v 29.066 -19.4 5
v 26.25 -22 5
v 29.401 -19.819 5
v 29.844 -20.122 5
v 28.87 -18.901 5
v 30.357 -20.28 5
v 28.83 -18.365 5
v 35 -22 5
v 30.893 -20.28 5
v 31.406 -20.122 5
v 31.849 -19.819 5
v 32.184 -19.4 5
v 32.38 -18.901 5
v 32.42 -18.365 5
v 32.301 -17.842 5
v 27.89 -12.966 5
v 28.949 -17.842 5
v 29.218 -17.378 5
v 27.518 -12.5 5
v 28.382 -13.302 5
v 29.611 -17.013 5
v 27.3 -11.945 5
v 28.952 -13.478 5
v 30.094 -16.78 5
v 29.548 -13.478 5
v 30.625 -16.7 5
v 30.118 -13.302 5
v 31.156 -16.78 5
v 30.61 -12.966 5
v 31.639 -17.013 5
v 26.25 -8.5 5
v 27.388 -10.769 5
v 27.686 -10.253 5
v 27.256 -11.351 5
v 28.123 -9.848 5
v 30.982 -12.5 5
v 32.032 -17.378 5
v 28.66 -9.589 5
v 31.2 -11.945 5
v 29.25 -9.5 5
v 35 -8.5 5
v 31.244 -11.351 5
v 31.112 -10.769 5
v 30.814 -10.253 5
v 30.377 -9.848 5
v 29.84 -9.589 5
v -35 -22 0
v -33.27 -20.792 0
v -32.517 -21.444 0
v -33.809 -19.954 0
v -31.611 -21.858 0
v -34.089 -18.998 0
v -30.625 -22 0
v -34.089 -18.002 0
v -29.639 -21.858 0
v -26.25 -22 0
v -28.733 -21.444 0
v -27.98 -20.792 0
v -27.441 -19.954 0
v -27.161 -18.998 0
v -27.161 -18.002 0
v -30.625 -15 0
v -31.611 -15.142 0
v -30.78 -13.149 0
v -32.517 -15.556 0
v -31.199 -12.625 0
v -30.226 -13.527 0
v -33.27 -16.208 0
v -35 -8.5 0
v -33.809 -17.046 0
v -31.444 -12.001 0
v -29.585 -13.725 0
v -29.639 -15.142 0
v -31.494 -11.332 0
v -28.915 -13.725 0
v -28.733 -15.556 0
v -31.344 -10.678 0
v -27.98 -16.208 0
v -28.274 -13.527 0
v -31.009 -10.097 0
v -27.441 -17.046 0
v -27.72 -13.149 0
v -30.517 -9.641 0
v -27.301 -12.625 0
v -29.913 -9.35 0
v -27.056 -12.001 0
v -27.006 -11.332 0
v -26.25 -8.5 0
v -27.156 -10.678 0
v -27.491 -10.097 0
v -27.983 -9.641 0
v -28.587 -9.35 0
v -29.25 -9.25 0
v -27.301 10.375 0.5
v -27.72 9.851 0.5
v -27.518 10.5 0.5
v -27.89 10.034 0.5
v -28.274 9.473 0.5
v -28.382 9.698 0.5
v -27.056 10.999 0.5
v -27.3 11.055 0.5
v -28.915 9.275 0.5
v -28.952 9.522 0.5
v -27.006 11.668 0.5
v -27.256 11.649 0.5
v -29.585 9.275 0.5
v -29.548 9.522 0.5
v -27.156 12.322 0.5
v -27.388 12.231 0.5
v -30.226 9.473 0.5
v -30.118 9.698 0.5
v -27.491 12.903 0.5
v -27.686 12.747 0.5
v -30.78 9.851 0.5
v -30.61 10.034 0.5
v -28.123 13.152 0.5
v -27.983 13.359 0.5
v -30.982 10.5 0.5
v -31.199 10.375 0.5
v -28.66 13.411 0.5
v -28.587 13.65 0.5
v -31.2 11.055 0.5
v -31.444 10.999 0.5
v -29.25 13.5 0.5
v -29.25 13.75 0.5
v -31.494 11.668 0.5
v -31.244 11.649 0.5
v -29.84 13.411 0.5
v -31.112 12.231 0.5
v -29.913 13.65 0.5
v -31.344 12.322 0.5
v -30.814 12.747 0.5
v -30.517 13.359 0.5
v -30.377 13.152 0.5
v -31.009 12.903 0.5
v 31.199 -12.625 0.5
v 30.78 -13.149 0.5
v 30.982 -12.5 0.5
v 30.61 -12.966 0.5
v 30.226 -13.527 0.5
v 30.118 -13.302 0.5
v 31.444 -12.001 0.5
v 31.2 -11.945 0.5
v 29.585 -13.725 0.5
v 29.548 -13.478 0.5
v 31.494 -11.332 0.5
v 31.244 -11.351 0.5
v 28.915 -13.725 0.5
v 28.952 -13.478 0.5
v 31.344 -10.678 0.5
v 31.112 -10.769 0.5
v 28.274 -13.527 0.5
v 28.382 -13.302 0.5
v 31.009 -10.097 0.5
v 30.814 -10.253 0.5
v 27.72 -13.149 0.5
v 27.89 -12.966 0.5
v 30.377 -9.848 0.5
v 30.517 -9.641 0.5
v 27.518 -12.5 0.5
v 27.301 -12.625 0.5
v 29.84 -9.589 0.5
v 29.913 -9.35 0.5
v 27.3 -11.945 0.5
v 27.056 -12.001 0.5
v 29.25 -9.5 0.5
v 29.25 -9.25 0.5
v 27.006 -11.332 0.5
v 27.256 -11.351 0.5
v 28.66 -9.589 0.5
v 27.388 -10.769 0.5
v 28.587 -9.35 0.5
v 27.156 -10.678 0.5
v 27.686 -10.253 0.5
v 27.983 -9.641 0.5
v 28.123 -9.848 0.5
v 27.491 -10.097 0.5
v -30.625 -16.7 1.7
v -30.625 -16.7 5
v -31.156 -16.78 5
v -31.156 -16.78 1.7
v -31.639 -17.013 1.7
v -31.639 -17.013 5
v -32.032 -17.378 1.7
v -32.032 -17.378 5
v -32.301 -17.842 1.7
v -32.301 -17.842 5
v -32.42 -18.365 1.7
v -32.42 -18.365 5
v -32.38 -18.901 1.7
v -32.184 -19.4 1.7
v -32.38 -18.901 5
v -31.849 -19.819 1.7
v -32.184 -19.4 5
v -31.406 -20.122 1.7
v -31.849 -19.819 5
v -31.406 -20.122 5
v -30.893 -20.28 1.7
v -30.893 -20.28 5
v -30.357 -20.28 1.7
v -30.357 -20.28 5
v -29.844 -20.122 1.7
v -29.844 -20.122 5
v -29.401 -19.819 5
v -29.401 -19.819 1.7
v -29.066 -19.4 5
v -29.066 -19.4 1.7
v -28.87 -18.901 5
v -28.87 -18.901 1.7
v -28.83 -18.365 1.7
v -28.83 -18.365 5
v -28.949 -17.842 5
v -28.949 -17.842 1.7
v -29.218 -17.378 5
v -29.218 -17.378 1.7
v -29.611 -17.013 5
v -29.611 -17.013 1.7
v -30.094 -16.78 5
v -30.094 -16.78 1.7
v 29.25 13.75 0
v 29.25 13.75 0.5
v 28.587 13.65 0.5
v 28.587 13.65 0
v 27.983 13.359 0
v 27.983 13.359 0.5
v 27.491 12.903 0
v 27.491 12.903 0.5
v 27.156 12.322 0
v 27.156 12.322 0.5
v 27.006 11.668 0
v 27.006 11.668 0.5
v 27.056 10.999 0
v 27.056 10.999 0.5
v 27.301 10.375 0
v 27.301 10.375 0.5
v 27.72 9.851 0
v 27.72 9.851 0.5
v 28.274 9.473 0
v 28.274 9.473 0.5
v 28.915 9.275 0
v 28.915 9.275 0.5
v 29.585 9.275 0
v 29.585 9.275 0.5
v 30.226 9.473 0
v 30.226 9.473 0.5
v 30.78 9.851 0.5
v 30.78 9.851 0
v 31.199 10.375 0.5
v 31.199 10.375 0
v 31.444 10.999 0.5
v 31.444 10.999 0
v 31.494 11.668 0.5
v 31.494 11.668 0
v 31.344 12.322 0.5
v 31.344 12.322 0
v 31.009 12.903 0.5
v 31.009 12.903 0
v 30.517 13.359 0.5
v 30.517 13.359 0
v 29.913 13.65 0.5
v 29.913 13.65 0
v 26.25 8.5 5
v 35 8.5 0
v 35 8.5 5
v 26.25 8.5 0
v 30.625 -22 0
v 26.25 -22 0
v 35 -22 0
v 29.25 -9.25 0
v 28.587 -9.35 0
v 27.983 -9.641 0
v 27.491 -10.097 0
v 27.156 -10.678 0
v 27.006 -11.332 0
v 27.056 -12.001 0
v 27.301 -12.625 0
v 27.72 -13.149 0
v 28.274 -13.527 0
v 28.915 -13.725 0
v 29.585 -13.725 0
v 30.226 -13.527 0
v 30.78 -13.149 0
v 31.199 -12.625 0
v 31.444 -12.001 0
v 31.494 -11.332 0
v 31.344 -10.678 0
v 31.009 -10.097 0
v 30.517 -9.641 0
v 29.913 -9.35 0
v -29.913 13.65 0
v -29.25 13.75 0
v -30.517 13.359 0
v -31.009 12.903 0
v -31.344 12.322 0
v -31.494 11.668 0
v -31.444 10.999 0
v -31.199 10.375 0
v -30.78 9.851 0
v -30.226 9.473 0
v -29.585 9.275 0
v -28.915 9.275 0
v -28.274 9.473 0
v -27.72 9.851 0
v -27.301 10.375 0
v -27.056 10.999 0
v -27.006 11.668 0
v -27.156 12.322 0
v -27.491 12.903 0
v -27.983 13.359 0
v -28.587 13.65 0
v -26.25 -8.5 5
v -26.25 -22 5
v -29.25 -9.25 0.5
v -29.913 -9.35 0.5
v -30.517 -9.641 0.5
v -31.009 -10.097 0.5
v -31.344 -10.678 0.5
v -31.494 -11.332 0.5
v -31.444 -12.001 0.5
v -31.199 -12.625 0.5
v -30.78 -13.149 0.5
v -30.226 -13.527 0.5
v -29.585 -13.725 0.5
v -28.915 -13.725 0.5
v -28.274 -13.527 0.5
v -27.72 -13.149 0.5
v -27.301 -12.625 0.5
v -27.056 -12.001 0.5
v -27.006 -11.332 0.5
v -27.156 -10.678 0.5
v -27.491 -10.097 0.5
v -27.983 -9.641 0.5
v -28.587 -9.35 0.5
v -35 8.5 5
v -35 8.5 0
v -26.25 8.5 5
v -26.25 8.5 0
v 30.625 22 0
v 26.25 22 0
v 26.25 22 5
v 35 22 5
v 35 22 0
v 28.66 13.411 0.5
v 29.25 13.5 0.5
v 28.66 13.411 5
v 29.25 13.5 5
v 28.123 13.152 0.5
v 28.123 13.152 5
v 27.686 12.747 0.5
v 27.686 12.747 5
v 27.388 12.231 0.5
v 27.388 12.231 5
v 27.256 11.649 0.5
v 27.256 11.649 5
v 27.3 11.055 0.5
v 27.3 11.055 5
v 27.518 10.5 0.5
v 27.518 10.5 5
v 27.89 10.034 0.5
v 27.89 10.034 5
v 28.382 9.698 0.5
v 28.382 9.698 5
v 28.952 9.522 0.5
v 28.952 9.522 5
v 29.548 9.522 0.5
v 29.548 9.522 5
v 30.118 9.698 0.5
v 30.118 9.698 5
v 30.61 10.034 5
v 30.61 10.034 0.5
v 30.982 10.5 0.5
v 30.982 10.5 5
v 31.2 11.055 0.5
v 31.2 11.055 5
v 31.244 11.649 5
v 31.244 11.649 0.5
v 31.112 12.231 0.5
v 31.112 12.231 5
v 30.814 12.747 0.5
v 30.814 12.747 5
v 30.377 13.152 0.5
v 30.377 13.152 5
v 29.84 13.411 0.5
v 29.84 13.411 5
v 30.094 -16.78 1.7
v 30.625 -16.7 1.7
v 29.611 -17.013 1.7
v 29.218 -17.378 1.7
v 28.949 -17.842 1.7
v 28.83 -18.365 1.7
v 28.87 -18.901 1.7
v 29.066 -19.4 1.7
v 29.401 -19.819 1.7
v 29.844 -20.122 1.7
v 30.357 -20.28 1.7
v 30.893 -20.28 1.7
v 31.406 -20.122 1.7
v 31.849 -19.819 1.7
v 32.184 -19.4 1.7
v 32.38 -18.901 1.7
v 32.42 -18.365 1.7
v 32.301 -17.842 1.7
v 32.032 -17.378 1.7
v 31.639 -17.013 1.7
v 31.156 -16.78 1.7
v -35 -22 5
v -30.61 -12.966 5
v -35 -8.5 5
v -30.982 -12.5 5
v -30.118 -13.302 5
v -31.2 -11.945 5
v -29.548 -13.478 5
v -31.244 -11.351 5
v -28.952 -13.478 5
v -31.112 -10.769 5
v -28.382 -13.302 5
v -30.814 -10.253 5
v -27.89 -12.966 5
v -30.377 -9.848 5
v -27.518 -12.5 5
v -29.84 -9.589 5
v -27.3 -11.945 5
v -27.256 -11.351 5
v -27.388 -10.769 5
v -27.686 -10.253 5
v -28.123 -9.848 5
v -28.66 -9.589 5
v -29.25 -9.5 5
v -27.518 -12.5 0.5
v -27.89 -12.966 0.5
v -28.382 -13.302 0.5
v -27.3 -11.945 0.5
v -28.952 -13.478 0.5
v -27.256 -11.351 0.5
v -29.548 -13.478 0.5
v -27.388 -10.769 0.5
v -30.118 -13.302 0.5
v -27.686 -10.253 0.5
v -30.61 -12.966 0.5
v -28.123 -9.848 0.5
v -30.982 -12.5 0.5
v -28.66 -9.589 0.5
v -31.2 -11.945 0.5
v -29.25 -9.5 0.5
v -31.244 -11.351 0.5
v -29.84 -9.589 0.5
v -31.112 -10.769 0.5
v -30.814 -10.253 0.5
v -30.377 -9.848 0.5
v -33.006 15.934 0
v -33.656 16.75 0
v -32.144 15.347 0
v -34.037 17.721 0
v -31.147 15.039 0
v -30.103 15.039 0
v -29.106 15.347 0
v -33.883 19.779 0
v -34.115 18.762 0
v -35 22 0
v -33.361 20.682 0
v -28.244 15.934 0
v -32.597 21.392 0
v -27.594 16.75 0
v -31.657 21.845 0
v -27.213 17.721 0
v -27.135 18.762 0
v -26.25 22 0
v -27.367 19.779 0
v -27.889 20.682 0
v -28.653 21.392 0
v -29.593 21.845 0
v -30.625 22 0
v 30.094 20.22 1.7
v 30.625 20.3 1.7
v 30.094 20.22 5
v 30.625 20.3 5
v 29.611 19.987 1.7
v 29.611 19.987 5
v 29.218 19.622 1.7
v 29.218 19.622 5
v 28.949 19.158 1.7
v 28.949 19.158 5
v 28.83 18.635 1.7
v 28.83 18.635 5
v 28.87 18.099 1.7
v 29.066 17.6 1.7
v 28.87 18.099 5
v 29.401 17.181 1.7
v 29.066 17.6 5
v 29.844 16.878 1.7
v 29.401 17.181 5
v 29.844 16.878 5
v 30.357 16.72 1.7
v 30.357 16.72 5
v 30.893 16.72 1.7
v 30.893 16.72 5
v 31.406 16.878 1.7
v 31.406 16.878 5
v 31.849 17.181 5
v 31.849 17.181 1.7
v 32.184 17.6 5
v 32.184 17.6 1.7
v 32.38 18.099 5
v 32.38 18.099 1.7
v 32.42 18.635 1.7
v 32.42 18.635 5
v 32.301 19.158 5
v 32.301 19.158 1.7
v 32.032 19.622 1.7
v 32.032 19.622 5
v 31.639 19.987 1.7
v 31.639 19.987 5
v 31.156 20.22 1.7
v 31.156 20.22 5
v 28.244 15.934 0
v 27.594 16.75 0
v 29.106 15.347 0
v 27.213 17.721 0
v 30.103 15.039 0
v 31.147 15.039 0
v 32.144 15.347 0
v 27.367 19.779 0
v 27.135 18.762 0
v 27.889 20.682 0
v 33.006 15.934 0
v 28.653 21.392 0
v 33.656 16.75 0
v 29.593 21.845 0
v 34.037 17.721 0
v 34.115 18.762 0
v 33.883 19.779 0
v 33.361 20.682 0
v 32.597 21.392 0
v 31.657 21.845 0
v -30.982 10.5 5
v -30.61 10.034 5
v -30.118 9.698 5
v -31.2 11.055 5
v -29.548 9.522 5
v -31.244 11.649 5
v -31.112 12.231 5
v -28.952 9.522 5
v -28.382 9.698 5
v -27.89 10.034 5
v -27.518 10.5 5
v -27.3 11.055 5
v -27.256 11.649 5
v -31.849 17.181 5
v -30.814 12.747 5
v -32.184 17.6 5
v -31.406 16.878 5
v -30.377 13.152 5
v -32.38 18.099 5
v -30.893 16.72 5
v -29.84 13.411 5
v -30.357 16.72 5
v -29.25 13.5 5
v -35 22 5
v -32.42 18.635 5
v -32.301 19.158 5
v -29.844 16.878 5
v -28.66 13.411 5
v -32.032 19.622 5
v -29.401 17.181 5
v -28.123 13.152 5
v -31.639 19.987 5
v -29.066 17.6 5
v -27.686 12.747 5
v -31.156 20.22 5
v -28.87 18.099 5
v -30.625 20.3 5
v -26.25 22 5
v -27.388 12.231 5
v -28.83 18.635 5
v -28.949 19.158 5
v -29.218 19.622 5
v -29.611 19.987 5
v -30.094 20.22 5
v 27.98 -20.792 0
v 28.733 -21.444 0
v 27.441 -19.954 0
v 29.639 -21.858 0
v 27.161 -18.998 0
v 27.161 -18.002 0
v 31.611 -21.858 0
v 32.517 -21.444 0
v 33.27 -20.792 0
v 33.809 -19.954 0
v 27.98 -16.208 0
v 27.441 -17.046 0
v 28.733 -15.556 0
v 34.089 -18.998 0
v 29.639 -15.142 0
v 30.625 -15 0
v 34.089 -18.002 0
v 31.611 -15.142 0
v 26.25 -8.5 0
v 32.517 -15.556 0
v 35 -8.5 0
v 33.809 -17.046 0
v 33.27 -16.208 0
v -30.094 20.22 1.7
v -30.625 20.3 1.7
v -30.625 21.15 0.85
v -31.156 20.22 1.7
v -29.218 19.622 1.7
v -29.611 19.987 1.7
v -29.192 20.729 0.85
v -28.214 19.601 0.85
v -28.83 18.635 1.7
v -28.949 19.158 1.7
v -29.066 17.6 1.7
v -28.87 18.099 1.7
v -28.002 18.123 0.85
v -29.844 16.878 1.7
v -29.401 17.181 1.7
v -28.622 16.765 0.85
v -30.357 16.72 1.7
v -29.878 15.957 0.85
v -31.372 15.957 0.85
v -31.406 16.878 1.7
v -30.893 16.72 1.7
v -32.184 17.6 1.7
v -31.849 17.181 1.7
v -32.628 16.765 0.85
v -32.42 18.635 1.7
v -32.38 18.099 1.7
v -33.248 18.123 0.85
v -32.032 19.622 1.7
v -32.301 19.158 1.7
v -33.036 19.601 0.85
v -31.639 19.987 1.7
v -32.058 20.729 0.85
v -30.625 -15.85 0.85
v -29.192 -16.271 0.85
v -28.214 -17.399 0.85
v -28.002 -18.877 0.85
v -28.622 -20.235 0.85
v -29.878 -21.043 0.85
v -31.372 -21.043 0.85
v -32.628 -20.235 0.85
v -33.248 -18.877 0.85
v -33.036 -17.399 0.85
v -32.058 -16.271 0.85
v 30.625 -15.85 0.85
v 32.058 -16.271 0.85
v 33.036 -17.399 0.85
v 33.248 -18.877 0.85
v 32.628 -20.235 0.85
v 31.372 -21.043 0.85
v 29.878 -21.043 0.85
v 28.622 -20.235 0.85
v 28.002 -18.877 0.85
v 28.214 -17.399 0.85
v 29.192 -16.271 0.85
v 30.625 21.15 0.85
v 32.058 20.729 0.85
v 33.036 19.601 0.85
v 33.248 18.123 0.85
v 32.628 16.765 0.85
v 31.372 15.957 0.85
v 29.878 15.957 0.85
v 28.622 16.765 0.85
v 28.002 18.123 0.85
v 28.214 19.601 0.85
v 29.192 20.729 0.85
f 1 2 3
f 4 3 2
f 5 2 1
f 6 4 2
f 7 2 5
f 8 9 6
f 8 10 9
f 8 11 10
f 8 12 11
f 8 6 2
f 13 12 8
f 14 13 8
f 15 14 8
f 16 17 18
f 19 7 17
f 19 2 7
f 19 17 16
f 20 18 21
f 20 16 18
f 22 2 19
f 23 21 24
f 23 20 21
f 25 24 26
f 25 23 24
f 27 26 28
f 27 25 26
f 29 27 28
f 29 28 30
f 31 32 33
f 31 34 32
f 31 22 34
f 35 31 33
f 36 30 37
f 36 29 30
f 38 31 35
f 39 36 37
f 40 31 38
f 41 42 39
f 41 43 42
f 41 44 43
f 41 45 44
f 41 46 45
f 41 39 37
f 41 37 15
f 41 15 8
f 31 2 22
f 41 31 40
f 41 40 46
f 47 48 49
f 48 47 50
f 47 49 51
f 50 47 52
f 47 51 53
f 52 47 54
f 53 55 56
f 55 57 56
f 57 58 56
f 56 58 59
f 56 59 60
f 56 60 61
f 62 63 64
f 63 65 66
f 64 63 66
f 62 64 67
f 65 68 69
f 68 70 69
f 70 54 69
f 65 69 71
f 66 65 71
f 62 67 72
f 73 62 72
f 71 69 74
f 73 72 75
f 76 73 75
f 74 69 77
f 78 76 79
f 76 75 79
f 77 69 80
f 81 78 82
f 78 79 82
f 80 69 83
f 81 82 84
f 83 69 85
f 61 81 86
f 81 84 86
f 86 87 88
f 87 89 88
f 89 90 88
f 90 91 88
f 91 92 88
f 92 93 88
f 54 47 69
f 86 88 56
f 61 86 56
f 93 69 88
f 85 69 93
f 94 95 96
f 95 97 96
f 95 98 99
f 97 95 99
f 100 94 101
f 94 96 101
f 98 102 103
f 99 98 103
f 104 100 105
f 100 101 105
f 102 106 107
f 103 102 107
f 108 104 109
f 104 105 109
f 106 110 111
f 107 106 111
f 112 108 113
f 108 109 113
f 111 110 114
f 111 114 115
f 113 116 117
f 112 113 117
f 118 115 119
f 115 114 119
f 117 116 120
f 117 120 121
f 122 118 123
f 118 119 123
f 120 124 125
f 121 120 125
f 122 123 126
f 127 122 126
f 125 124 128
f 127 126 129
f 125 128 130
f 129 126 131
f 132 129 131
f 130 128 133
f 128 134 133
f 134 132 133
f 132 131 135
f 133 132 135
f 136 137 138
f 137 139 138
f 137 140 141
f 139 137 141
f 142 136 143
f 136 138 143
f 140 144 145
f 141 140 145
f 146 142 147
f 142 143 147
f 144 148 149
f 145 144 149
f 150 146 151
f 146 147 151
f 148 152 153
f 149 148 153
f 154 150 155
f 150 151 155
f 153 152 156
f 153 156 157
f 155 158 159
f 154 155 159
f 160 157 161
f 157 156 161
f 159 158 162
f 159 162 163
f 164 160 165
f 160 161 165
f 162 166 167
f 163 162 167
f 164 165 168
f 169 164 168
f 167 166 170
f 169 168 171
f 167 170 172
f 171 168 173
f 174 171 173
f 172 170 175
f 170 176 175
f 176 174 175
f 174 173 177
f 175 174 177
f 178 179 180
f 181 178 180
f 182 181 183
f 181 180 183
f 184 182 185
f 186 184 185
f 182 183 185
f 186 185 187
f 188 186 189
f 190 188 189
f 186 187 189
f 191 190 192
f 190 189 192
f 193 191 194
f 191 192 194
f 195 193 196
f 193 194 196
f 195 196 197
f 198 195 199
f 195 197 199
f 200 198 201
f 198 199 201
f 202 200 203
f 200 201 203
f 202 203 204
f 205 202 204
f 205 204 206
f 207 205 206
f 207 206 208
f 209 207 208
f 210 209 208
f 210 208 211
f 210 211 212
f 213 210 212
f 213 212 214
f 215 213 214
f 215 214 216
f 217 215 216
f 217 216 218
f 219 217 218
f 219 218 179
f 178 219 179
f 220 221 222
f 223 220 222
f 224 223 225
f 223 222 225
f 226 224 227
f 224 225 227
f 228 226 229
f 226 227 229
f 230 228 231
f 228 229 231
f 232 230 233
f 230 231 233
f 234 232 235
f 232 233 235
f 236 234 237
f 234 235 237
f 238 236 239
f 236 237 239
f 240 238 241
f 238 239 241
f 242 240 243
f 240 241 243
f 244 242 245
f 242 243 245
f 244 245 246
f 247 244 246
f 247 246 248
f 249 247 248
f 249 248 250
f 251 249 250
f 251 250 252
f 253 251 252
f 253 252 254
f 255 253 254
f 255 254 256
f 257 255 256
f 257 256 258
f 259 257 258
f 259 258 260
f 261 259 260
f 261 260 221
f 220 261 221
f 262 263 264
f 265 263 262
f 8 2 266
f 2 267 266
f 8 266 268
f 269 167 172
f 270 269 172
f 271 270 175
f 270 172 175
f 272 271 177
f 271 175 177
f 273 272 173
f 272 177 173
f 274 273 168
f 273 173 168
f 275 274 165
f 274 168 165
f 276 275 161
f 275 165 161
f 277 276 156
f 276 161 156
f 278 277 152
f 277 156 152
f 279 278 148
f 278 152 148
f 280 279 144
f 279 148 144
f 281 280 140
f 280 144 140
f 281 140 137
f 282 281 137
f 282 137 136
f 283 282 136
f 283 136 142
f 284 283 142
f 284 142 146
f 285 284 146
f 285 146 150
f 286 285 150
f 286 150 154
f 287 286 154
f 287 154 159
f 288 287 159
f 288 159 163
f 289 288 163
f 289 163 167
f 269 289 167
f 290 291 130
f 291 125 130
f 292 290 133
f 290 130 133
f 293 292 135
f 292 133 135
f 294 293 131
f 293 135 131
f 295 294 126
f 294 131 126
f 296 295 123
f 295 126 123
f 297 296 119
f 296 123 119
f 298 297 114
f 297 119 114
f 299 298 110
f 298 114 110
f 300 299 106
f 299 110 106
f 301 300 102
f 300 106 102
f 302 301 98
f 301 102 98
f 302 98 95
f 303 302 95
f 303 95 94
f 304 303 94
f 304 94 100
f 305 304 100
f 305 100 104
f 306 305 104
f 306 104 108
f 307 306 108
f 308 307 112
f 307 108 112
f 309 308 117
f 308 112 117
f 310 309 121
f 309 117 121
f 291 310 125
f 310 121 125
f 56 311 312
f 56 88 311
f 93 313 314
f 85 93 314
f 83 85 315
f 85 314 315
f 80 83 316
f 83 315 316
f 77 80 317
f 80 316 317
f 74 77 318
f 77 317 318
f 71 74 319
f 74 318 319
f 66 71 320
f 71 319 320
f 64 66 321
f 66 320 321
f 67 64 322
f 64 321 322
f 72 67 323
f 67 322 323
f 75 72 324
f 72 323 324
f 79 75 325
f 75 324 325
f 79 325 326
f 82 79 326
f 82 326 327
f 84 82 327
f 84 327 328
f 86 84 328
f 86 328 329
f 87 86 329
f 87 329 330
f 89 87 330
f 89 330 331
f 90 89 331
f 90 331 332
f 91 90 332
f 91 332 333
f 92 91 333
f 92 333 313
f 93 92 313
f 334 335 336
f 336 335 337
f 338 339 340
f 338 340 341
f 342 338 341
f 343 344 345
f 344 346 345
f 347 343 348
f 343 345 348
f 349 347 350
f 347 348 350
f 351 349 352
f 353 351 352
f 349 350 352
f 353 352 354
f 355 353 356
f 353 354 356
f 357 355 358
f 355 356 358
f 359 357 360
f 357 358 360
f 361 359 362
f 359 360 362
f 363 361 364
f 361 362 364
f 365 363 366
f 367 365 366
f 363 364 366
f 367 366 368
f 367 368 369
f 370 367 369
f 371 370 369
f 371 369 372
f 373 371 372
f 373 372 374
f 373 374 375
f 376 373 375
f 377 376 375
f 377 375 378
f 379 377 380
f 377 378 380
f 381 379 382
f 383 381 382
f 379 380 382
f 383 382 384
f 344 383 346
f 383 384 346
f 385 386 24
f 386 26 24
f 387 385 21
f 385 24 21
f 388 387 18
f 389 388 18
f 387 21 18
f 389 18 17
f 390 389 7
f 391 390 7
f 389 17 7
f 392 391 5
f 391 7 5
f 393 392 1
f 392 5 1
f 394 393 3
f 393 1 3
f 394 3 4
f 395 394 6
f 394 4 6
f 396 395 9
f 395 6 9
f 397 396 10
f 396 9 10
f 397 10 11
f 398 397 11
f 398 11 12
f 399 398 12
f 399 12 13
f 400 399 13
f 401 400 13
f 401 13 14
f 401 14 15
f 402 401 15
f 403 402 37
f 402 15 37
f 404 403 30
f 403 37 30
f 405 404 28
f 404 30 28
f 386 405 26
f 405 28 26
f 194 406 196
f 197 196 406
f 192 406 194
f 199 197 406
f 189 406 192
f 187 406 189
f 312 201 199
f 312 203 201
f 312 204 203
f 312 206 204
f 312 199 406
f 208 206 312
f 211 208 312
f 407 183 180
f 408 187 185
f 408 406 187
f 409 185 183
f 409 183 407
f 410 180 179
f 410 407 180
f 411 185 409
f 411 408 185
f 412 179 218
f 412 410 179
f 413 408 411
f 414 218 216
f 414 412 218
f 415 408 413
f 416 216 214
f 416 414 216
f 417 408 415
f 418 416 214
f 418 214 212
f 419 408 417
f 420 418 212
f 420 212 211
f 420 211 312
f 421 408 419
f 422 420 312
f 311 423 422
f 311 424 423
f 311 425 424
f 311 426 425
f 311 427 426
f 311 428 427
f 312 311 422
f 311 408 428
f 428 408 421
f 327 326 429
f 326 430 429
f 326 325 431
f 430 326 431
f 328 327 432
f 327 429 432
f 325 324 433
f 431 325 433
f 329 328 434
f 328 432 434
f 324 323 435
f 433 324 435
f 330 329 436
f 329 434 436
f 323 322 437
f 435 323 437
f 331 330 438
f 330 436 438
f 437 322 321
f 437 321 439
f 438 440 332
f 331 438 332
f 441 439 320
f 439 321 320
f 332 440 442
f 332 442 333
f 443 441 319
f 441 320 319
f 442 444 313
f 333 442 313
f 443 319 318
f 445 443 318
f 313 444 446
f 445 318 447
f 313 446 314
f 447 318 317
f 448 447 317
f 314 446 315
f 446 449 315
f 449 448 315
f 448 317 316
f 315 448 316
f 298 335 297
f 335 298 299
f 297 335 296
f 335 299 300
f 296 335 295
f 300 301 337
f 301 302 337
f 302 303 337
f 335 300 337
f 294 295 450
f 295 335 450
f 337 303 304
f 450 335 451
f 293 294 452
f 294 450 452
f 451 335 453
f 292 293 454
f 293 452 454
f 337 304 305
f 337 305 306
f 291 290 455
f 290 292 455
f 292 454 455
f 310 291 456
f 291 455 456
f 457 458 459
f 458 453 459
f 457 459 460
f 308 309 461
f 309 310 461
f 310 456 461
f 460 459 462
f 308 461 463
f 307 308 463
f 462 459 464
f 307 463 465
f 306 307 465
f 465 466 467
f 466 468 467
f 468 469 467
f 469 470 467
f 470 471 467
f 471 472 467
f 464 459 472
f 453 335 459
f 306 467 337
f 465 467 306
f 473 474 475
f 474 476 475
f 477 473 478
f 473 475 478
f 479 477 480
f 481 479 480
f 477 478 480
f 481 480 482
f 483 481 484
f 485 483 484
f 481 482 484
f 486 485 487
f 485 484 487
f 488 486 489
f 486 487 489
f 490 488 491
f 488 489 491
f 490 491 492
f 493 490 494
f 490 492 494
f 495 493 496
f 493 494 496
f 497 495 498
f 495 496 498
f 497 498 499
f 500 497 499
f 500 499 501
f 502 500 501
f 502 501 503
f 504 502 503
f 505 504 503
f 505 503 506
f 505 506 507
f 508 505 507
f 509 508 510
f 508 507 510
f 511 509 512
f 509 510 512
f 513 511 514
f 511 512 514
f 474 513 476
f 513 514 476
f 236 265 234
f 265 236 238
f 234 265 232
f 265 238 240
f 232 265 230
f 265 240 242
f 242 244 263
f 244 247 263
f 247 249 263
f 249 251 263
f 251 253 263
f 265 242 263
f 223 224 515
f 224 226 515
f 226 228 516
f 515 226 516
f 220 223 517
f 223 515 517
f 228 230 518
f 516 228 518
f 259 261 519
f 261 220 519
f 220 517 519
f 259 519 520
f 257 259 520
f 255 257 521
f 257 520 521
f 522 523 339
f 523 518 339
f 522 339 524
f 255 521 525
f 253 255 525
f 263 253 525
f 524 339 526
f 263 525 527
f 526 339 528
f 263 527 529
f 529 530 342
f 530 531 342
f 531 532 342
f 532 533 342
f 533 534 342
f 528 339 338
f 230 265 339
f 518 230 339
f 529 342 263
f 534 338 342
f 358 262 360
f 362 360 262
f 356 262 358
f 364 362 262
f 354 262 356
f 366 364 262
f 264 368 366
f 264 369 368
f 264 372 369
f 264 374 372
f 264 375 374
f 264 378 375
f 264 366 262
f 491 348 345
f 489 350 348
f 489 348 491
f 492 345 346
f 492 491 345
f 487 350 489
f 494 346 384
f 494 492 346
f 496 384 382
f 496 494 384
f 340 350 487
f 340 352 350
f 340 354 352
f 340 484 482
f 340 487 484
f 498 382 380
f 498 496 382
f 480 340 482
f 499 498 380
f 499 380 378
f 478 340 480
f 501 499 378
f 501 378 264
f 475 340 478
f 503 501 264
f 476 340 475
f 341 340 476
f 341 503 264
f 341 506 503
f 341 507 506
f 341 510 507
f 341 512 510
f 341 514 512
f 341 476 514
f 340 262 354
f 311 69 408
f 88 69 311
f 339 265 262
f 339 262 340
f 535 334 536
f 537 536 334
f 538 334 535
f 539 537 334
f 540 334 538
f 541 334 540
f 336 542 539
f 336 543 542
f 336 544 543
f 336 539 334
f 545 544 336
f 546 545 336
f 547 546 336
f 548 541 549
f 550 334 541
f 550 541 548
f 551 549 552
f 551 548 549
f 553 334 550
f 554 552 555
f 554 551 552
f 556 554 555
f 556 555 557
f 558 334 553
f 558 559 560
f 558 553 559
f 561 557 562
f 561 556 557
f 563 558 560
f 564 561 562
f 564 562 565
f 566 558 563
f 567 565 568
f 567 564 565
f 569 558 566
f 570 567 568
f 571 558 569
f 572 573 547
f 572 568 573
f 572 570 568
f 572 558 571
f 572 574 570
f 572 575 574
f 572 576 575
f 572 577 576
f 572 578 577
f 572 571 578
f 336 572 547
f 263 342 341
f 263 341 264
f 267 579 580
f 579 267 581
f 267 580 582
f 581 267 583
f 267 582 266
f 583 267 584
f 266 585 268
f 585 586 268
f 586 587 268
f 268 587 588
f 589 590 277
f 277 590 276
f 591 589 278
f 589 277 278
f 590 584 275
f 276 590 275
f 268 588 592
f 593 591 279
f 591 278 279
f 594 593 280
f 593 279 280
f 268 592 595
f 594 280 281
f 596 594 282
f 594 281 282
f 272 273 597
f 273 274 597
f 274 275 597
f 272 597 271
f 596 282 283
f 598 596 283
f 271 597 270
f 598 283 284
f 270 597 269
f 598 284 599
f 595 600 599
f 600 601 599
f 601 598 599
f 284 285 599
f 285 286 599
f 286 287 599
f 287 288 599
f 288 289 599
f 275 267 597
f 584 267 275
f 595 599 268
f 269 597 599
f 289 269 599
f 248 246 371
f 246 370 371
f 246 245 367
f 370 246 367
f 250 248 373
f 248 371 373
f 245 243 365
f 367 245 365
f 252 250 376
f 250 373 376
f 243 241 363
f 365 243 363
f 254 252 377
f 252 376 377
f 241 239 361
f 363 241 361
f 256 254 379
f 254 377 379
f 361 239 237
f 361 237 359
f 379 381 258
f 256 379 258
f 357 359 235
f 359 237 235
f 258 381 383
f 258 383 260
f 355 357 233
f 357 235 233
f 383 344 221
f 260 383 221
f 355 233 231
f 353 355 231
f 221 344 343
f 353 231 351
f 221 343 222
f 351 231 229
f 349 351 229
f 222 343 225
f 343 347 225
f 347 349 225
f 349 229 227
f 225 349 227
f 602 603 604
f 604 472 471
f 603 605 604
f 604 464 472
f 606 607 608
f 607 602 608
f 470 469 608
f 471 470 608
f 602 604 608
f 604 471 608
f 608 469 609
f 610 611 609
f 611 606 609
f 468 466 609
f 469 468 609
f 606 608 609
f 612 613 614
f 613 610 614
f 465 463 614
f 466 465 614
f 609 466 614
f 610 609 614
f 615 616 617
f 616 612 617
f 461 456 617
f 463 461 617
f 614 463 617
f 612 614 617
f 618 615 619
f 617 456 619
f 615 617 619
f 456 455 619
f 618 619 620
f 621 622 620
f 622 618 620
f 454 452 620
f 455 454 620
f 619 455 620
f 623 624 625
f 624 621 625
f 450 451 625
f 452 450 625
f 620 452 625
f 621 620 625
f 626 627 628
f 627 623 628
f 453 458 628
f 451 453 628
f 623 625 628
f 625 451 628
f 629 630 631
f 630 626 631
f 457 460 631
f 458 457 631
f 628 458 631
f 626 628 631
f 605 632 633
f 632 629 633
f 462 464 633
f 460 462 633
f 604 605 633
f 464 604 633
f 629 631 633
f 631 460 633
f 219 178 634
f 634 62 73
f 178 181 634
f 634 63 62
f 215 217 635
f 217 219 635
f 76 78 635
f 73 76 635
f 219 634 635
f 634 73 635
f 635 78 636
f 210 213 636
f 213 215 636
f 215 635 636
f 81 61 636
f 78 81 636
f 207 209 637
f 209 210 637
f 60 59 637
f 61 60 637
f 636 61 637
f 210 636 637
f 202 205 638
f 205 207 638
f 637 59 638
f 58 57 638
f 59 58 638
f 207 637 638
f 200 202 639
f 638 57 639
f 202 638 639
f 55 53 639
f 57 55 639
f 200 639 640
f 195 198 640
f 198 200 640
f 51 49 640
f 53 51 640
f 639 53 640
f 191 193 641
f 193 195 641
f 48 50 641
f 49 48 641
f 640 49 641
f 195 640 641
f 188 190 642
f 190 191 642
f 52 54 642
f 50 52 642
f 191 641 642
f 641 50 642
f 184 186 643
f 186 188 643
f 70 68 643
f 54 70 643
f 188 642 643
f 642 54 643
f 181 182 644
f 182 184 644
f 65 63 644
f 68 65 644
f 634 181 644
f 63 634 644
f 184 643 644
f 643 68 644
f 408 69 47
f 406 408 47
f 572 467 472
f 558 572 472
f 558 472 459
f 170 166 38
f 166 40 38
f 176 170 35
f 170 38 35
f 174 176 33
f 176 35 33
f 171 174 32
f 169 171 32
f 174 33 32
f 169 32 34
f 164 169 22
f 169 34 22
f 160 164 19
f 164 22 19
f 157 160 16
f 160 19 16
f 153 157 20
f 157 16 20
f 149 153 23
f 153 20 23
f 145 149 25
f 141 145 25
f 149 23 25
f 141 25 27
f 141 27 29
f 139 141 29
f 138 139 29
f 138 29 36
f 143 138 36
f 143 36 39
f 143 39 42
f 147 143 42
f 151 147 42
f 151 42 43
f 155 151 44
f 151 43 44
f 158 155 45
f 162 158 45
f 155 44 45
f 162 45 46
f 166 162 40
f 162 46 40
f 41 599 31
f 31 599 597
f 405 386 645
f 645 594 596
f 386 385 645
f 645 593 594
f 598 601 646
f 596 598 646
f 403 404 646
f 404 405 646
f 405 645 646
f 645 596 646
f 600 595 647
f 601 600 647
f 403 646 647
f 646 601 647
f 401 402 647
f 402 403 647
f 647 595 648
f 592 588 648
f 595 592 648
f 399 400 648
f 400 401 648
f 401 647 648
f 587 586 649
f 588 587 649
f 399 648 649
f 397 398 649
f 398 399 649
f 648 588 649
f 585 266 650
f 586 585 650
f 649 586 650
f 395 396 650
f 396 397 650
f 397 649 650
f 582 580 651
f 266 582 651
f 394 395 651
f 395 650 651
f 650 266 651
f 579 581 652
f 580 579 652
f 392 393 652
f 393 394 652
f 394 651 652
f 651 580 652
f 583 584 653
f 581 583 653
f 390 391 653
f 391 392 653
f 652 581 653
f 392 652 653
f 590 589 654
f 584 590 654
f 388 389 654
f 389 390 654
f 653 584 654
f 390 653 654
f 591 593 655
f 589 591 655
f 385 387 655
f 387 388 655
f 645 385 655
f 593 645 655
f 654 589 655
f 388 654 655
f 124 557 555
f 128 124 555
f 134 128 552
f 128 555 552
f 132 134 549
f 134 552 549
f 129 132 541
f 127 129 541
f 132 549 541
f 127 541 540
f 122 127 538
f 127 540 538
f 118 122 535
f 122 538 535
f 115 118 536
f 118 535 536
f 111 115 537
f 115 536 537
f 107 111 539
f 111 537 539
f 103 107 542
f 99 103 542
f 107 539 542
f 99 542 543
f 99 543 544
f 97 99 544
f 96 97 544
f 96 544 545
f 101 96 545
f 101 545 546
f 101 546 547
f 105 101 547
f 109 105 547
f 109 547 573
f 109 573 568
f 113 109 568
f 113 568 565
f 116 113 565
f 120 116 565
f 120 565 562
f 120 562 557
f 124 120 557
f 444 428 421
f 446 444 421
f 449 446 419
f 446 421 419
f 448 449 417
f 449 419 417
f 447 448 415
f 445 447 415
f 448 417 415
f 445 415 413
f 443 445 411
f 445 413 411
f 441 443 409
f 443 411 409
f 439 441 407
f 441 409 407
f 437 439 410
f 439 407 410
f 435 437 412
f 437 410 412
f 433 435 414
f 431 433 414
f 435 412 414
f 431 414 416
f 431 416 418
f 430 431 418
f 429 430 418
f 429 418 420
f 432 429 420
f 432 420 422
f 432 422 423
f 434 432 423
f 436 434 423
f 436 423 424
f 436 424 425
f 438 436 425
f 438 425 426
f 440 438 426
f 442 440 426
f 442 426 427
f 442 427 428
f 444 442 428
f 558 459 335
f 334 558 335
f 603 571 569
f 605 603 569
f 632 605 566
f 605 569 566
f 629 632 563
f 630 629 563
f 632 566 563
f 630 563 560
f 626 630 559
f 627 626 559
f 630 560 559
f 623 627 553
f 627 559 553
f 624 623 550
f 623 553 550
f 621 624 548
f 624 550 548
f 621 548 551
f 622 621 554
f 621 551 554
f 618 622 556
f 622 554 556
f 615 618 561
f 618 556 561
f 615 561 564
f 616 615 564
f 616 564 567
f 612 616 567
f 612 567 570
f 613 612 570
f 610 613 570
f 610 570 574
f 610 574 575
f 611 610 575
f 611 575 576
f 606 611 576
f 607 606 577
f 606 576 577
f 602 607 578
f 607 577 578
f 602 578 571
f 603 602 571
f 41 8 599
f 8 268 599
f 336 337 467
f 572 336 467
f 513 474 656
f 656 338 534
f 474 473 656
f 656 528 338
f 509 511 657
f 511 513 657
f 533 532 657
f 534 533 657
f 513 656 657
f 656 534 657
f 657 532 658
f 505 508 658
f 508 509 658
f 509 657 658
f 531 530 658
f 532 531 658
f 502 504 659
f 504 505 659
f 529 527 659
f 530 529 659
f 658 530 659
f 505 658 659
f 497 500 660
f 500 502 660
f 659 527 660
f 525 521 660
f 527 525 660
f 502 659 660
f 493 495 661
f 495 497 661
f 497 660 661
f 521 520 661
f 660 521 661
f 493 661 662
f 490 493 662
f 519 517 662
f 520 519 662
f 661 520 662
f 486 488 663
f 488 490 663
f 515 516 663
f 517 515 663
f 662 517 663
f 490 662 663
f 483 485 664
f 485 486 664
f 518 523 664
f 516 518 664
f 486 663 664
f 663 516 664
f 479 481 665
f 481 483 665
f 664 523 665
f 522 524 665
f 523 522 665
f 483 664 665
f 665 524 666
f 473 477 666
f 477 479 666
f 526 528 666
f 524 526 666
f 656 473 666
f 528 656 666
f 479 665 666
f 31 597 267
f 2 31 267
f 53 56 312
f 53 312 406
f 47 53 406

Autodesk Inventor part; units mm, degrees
ref_plane "YZ Plane" through (0, 0, 0) normal (1, 0, 0) x (0, 1, 0)
ref_plane "XZ Plane" through (0, 0, 0) normal (0, 1, 0) x (-1, 0, 0)
ref_plane "XY Plane" through (0, 0, 0) normal (0, 0, 1) x (1, 0, 0)
ref_plane "Work Plane1" through (0, 0, 0) normal (0, 0, 1) x (1, 0, 0)
sketch "Sketch1" plane through (0, 0, 0) normal (0, 0, 1) x (1, 0, 0)
  line L0 (-35, 15) -> (-35, -15) projected
  line L1 (-35, -15) -> (35, -15) projected
  line L2 (35, -15) -> (35, 15) projected
  line L3 (35, 15) -> (-35, 15) projected
  circle A0 centre (29.25, 11.5) radius 1.5 projected
  circle A1 centre (29.25, -11.5) radius 1.5 projected
  circle A2 centre (-29.25, 11.5) radius 1.5 projected
  circle A3 centre (-29.25, -11.5) radius 1.5 projected
  line L4 (35, 8.5) -> (26.25, 8.5)
  line L5 (26.25, 8.5) -> (26.25, 22)
  line L6 (26.25, 22) -> (35, 22)
  line L7 (35, 22) -> (35, 8.5)
  line L8 (35, -8.5) -> (26.25, -8.5)
  line L9 (26.25, -8.5) -> (26.25, -22)
  line L10 (26.25, -22) -> (35, -22)
  line L11 (35, -22) -> (35, -8.5)
  line L12 (-35, 8.5) -> (-26.25, 8.5)
  line L13 (-26.25, 8.5) -> (-26.25, 22)
  line L14 (-26.25, 22) -> (-35, 22)
  line L15 (-35, 22) -> (-35, 8.5)
  line L16 (-35, -8.5) -> (-26.25, -8.5)
  line L17 (-26.25, -8.5) -> (-26.25, -22)
  line L18 (-26.25, -22) -> (-35, -22)
  line L19 (-35, -22) -> (-35, -8.5)
  point P0 (0, 0)
  dimension "d0" = 3
  dimension "d1" = 3
  dimension "d2" = 7
  dimension "d3" = 3
  dimension "d4" = 3
  dimension "d5" = 7
  dimension "d6" = 7
  dimension "d7" = 3
  dimension "d8" = 3
  dimension "d9" = 3
  dimension "d10" = 3
  dimension "d11" = 7
extrude "Extrusion1" add sketch "Sketch1" along normal blind 5 contours L3 L13 L12 L0 | L15 L14 L13 L3 | L16 L17 L1 L0 | L5 L6 L7 L3 | L3 L2 L4 L5 | L1 L17 L18 L19 | L9 L8 L2 L1 | L1 L11 L10 L9 | A0 | A1 | A2 | A3
sketch "Sketch2" plane through (0, 0, 0) normal (0, 0, -1) x (-1, 0, 0)
  line L0 (-22.6874, -6.3823) -> (-22.6874, 8.2103) projected
  line L1 (-22.6874, 8.2103) -> (19.4692, 8.2103) projected
  line L2 (19.4692, 8.2103) -> (19.4692, -6.3823) projected
  line L3 (19.4692, -6.3823) -> (-22.6874, -6.3823) projected
  line L4 (35, 15) -> (35, -15) projected
  line L5 (-35, 15) -> (35, 15) projected
  line L6 (-35, -15) -> (-35, 15) projected
  line L7 (35, -15) -> (-35, -15) projected
  circle A0 centre (-29.25, 11.5) radius 1.5 projected
  circle A1 centre (-29.25, -11.5) radius 1.5 projected
  circle A2 centre (29.25, 11.5) radius 1.5 projected
  circle A3 centre (29.25, -11.5) radius 1.5 projected
  point P0 (0, 0)
hole "Hole1" at (29.25, 11.5, 0) at (29.25, -11.5, 0) at (-29.25, -11.5, 0) at (-29.25, 11.5, 0) direction (0, 0, 1) diameter 4 depth 5 counterbore diameter 4.5 counterbore depth 0.5
sketch "Sketch3" plane through (0, 0, 0) normal (0, 0, -1) x (-1, 0, 0)
  circle A0 centre (29.25, 11.5) radius 2.25 projected
  line L0 (26.25, 22) -> (35, 22) projected
  line L1 (26.25, 8.5) -> (26.25, 22) projected
  line L2 (35, 8.5) -> (26.25, 8.5) projected
  line L3 (35, 22) -> (35, 8.5) projected
  circle A1 centre (29.25, -11.5) radius 2.25 projected
  line L4 (26.25, -8.5) -> (35, -8.5) projected
  line L5 (26.25, -22) -> (26.25, -8.5) projected
  line L6 (35, -22) -> (26.25, -22) projected
  line L7 (35, -8.5) -> (35, -22) projected
  circle A2 centre (-29.25, -11.5) radius 2.25 projected
  line L8 (-26.25, -22) -> (-35, -22) projected
  line L9 (-26.25, -8.5) -> (-26.25, -22) projected
  line L10 (-35, -8.5) -> (-26.25, -8.5) projected
  line L11 (-35, -22) -> (-35, -8.5) projected
  circle A3 centre (-29.25, 11.5) radius 2.25 projected
  line L12 (-26.25, 8.5) -> (-35, 8.5) projected
  line L13 (-26.25, 22) -> (-26.25, 8.5) projected
  line L14 (-35, 22) -> (-26.25, 22) projected
  line L15 (-35, 8.5) -> (-35, 22) projected
  line L16 (-22.6874, -6.3823) -> (-22.6874, 8.2103) projected
  line L17 (-22.6874, 8.2103) -> (19.4692, 8.2103) projected
  line L18 (19.4692, 8.2103) -> (19.4692, -6.3823) projected
  line L19 (19.4692, -6.3823) -> (-22.6874, -6.3823) projected
  line L20 (35, 15) -> (35, -15) projected
  line L21 (-35, 15) -> (35, 15) projected
  line L22 (-35, -15) -> (-35, 15) projected
  line L23 (35, -15) -> (-35, -15) projected
  circle A4 centre (-29.25, 11.5) radius 1.5 projected
  circle A5 centre (-29.25, -11.5) radius 1.5 projected
  circle A6 centre (29.25, 11.5) radius 1.5 projected
  circle A7 centre (29.25, -11.5) radius 1.5 projected
  line L24 (26.25, 22) -> (35, 22) projected
  line L25 (35, 22) -> (26.25, 15.25)
  line L26 (26.25, 8.5) -> (26.25, 22) projected
  line L27 (35, 15) -> (26.25, 22)
  line L28 (26.25, -22) -> (26.25, -8.5) projected
  line L29 (26.25, -22) -> (35, -15)
  line L30 (26.25, -15) -> (35, -22)
  line L31 (-35, 15) -> (-26.25, 22)
  line L32 (-26.25, 22) -> (-26.25, 8.5) projected
  line L33 (-35, 22) -> (-26.25, 22) projected
  line L34 (-26.25, 15) -> (-35, 22)
  line L35 (-26.25, -8.5) -> (-26.25, -22) projected
  line L36 (-26.25, -15.25) -> (-35, -22)
  line L37 (-26.25, -22) -> (-35, -15)
  point P0 (0, 0)
  point P1 (30.625, 18.5)
  point P2 (30.625, -18.5)
  point P3 (-30.625, -18.5)
  point P4 (-30.625, 18.5)
hole "Hole2" at (-30.625, 18.5, 0) at (-30.625, -18.5, 0) at (30.625, -18.5, 0) at (30.625, 18.5, 0) direction (0, 0, 1) diameter 3.6 depth 5 countersink diameter 7 countersink angle 90 clearance for "Countersunk Flat Head Screw ISO 2009/7046" size "M3" standard "ISO"
properties part number "my_pcb_holder"
